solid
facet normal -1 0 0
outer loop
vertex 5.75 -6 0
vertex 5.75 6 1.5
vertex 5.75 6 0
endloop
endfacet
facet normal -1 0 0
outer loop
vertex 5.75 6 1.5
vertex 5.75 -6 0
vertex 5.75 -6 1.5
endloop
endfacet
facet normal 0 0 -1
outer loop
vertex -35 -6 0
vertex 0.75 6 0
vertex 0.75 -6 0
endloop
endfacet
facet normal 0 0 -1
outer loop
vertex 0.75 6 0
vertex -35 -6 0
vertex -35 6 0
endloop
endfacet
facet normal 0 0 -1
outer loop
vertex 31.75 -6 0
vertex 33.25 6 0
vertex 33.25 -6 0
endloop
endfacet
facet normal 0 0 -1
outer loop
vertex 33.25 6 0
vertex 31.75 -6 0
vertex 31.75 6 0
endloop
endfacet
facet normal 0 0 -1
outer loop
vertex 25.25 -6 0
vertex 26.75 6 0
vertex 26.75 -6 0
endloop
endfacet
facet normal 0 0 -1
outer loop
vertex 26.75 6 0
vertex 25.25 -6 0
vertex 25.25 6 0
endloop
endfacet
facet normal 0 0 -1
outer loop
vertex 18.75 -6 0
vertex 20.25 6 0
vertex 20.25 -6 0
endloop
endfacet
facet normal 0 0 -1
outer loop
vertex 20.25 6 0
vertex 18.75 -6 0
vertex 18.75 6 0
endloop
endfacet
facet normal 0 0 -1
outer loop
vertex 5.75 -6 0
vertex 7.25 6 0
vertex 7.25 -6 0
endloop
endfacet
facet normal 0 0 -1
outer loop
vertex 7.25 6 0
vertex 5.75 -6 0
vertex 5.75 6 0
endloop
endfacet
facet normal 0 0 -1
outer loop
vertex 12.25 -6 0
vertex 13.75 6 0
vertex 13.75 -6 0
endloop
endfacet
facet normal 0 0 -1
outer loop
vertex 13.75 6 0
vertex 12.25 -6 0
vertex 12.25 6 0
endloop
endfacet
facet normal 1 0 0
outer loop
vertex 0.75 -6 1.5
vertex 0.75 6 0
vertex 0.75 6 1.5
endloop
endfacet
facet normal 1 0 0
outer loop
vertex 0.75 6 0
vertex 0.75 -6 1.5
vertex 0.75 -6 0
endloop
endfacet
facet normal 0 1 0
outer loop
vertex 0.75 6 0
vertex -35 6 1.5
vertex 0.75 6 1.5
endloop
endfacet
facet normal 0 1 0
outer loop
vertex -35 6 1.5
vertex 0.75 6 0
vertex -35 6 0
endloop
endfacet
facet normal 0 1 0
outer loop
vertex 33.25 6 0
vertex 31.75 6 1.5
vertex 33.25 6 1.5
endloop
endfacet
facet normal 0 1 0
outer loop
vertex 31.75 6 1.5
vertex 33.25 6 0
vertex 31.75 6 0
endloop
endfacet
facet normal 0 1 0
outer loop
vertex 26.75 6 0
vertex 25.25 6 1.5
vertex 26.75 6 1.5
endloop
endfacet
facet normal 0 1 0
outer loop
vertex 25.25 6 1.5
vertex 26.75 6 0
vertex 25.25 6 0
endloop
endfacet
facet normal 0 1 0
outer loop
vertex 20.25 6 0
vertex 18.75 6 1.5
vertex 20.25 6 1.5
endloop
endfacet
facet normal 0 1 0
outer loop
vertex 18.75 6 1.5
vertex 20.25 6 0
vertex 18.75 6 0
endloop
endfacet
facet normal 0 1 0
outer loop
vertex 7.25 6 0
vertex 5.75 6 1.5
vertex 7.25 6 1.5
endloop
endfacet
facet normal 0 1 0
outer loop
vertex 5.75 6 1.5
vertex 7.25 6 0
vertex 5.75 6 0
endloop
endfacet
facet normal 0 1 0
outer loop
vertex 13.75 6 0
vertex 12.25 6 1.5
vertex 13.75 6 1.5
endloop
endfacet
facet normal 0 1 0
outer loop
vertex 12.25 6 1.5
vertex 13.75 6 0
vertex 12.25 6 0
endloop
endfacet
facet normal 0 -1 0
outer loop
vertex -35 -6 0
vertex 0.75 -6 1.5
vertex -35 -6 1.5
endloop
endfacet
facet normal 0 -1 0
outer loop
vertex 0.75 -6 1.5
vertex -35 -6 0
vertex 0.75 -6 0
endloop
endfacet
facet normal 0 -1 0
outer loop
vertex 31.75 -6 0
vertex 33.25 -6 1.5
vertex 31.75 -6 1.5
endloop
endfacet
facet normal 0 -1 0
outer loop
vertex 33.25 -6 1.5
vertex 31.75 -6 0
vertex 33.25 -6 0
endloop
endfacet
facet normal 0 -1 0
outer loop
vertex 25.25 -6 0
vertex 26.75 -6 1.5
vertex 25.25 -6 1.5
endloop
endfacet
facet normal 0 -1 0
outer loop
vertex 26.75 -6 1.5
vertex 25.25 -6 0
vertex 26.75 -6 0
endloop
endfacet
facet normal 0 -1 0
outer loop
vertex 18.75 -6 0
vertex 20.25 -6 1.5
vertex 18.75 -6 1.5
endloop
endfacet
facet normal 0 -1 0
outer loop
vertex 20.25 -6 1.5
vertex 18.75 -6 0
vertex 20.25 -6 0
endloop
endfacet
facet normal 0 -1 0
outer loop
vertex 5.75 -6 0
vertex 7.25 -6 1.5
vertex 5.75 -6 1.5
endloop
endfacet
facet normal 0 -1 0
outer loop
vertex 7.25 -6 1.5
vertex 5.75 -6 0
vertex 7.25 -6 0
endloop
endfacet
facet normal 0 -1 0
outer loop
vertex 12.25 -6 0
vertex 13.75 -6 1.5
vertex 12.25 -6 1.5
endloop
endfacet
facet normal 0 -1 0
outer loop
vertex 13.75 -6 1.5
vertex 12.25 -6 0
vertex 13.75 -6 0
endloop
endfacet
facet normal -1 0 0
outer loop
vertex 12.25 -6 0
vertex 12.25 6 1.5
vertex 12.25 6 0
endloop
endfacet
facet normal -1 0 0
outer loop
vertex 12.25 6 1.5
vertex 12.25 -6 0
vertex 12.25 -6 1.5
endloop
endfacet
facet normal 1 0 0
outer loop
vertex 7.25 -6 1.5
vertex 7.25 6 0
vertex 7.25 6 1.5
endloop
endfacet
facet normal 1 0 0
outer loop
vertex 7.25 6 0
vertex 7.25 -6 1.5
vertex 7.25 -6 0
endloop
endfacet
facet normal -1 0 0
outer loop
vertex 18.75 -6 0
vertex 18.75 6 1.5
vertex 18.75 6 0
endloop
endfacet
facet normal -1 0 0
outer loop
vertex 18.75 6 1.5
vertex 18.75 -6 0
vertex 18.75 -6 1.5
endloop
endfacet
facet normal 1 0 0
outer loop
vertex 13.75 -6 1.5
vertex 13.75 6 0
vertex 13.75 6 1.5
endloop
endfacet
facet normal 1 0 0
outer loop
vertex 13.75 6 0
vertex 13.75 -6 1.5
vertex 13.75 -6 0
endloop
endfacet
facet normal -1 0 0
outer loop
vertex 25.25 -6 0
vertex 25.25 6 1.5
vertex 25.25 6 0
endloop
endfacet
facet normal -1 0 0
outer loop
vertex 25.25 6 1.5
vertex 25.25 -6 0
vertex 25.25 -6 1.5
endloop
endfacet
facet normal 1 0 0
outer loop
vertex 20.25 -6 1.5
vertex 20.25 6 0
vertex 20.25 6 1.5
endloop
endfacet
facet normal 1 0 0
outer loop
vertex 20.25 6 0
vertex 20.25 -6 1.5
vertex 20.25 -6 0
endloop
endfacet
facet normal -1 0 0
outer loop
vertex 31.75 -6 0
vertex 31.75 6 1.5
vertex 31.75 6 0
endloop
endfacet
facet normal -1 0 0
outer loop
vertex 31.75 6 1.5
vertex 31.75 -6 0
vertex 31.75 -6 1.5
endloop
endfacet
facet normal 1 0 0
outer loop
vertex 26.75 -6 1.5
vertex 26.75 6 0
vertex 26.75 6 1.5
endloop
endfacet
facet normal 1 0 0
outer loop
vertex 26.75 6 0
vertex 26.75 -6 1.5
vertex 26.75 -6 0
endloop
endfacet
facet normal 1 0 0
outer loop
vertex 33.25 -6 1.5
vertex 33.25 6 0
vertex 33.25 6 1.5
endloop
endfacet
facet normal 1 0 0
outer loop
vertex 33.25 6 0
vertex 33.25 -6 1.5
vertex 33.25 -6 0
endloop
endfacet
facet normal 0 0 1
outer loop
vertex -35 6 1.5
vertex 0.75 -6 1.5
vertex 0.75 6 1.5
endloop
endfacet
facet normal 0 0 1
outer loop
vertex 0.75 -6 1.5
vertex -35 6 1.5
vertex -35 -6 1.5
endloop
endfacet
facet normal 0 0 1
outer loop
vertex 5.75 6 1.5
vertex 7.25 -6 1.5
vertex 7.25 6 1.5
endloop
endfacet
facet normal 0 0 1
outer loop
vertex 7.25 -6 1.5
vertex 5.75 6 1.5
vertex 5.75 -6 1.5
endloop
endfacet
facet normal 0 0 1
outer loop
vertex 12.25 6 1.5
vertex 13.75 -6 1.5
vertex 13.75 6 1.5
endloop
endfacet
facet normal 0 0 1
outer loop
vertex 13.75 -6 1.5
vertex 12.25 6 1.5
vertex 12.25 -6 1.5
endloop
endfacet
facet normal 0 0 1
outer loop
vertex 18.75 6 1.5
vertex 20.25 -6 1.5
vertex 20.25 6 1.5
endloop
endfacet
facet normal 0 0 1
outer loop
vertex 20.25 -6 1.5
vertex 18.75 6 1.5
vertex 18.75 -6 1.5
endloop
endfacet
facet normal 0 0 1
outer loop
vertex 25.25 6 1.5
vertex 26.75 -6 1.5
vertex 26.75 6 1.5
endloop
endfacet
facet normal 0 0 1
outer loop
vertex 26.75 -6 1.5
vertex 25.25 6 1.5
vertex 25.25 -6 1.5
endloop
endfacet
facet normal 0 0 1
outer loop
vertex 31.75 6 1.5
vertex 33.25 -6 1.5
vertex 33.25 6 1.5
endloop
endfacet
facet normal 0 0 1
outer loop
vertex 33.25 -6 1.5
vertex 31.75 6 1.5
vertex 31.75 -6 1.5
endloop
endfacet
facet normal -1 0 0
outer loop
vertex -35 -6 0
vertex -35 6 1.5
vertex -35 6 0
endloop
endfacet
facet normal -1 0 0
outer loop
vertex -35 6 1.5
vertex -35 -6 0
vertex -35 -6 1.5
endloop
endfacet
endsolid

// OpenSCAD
// 10-well agarose gel comb - printed lying flat
// Units: mm

// ---------- Parameters ----------
num_teeth     = 10;    // number of wells
plate_thick   = 1.5;   // comb plate thickness (Z)
spine_len     = 70;    // spine (back bar) length (X)
spine_wid     = 12;    // spine width (Y)
teeth_wid     = 5.0;   // tooth width (X)
teeth_len     = 12;    // tooth length (Y)
gap           = 1.5;   // gap between neighbouring teeth (X)
cut_extra     = 0.5;   // extra length on cutters to avoid coplanar faces

// ---------- Derived ----------
total_teeth_wid = num_teeth * teeth_wid + (num_teeth - 1) * gap;
x_start         = (spine_len - total_teeth_wid) / 2;  // first tooth X centre

// ---------- Model ----------
difference() {
    // Base plate with spine running along X
    translate([-spine_len / 2, -spine_wid / 2, 0])
        cube([spine_len, spine_wid, plate_thick]);

    // Teeth hanging from the -Y edge of the spine
    for (i = [0 : num_teeth - 1]) {
        translate([x_start + i * (teeth_wid + gap) - teeth_wid / 2,
                   -teeth_len / 2,
                   0])
            cube([teeth_wid, teeth_len, plate_thick + cut_extra]);
    }
}
